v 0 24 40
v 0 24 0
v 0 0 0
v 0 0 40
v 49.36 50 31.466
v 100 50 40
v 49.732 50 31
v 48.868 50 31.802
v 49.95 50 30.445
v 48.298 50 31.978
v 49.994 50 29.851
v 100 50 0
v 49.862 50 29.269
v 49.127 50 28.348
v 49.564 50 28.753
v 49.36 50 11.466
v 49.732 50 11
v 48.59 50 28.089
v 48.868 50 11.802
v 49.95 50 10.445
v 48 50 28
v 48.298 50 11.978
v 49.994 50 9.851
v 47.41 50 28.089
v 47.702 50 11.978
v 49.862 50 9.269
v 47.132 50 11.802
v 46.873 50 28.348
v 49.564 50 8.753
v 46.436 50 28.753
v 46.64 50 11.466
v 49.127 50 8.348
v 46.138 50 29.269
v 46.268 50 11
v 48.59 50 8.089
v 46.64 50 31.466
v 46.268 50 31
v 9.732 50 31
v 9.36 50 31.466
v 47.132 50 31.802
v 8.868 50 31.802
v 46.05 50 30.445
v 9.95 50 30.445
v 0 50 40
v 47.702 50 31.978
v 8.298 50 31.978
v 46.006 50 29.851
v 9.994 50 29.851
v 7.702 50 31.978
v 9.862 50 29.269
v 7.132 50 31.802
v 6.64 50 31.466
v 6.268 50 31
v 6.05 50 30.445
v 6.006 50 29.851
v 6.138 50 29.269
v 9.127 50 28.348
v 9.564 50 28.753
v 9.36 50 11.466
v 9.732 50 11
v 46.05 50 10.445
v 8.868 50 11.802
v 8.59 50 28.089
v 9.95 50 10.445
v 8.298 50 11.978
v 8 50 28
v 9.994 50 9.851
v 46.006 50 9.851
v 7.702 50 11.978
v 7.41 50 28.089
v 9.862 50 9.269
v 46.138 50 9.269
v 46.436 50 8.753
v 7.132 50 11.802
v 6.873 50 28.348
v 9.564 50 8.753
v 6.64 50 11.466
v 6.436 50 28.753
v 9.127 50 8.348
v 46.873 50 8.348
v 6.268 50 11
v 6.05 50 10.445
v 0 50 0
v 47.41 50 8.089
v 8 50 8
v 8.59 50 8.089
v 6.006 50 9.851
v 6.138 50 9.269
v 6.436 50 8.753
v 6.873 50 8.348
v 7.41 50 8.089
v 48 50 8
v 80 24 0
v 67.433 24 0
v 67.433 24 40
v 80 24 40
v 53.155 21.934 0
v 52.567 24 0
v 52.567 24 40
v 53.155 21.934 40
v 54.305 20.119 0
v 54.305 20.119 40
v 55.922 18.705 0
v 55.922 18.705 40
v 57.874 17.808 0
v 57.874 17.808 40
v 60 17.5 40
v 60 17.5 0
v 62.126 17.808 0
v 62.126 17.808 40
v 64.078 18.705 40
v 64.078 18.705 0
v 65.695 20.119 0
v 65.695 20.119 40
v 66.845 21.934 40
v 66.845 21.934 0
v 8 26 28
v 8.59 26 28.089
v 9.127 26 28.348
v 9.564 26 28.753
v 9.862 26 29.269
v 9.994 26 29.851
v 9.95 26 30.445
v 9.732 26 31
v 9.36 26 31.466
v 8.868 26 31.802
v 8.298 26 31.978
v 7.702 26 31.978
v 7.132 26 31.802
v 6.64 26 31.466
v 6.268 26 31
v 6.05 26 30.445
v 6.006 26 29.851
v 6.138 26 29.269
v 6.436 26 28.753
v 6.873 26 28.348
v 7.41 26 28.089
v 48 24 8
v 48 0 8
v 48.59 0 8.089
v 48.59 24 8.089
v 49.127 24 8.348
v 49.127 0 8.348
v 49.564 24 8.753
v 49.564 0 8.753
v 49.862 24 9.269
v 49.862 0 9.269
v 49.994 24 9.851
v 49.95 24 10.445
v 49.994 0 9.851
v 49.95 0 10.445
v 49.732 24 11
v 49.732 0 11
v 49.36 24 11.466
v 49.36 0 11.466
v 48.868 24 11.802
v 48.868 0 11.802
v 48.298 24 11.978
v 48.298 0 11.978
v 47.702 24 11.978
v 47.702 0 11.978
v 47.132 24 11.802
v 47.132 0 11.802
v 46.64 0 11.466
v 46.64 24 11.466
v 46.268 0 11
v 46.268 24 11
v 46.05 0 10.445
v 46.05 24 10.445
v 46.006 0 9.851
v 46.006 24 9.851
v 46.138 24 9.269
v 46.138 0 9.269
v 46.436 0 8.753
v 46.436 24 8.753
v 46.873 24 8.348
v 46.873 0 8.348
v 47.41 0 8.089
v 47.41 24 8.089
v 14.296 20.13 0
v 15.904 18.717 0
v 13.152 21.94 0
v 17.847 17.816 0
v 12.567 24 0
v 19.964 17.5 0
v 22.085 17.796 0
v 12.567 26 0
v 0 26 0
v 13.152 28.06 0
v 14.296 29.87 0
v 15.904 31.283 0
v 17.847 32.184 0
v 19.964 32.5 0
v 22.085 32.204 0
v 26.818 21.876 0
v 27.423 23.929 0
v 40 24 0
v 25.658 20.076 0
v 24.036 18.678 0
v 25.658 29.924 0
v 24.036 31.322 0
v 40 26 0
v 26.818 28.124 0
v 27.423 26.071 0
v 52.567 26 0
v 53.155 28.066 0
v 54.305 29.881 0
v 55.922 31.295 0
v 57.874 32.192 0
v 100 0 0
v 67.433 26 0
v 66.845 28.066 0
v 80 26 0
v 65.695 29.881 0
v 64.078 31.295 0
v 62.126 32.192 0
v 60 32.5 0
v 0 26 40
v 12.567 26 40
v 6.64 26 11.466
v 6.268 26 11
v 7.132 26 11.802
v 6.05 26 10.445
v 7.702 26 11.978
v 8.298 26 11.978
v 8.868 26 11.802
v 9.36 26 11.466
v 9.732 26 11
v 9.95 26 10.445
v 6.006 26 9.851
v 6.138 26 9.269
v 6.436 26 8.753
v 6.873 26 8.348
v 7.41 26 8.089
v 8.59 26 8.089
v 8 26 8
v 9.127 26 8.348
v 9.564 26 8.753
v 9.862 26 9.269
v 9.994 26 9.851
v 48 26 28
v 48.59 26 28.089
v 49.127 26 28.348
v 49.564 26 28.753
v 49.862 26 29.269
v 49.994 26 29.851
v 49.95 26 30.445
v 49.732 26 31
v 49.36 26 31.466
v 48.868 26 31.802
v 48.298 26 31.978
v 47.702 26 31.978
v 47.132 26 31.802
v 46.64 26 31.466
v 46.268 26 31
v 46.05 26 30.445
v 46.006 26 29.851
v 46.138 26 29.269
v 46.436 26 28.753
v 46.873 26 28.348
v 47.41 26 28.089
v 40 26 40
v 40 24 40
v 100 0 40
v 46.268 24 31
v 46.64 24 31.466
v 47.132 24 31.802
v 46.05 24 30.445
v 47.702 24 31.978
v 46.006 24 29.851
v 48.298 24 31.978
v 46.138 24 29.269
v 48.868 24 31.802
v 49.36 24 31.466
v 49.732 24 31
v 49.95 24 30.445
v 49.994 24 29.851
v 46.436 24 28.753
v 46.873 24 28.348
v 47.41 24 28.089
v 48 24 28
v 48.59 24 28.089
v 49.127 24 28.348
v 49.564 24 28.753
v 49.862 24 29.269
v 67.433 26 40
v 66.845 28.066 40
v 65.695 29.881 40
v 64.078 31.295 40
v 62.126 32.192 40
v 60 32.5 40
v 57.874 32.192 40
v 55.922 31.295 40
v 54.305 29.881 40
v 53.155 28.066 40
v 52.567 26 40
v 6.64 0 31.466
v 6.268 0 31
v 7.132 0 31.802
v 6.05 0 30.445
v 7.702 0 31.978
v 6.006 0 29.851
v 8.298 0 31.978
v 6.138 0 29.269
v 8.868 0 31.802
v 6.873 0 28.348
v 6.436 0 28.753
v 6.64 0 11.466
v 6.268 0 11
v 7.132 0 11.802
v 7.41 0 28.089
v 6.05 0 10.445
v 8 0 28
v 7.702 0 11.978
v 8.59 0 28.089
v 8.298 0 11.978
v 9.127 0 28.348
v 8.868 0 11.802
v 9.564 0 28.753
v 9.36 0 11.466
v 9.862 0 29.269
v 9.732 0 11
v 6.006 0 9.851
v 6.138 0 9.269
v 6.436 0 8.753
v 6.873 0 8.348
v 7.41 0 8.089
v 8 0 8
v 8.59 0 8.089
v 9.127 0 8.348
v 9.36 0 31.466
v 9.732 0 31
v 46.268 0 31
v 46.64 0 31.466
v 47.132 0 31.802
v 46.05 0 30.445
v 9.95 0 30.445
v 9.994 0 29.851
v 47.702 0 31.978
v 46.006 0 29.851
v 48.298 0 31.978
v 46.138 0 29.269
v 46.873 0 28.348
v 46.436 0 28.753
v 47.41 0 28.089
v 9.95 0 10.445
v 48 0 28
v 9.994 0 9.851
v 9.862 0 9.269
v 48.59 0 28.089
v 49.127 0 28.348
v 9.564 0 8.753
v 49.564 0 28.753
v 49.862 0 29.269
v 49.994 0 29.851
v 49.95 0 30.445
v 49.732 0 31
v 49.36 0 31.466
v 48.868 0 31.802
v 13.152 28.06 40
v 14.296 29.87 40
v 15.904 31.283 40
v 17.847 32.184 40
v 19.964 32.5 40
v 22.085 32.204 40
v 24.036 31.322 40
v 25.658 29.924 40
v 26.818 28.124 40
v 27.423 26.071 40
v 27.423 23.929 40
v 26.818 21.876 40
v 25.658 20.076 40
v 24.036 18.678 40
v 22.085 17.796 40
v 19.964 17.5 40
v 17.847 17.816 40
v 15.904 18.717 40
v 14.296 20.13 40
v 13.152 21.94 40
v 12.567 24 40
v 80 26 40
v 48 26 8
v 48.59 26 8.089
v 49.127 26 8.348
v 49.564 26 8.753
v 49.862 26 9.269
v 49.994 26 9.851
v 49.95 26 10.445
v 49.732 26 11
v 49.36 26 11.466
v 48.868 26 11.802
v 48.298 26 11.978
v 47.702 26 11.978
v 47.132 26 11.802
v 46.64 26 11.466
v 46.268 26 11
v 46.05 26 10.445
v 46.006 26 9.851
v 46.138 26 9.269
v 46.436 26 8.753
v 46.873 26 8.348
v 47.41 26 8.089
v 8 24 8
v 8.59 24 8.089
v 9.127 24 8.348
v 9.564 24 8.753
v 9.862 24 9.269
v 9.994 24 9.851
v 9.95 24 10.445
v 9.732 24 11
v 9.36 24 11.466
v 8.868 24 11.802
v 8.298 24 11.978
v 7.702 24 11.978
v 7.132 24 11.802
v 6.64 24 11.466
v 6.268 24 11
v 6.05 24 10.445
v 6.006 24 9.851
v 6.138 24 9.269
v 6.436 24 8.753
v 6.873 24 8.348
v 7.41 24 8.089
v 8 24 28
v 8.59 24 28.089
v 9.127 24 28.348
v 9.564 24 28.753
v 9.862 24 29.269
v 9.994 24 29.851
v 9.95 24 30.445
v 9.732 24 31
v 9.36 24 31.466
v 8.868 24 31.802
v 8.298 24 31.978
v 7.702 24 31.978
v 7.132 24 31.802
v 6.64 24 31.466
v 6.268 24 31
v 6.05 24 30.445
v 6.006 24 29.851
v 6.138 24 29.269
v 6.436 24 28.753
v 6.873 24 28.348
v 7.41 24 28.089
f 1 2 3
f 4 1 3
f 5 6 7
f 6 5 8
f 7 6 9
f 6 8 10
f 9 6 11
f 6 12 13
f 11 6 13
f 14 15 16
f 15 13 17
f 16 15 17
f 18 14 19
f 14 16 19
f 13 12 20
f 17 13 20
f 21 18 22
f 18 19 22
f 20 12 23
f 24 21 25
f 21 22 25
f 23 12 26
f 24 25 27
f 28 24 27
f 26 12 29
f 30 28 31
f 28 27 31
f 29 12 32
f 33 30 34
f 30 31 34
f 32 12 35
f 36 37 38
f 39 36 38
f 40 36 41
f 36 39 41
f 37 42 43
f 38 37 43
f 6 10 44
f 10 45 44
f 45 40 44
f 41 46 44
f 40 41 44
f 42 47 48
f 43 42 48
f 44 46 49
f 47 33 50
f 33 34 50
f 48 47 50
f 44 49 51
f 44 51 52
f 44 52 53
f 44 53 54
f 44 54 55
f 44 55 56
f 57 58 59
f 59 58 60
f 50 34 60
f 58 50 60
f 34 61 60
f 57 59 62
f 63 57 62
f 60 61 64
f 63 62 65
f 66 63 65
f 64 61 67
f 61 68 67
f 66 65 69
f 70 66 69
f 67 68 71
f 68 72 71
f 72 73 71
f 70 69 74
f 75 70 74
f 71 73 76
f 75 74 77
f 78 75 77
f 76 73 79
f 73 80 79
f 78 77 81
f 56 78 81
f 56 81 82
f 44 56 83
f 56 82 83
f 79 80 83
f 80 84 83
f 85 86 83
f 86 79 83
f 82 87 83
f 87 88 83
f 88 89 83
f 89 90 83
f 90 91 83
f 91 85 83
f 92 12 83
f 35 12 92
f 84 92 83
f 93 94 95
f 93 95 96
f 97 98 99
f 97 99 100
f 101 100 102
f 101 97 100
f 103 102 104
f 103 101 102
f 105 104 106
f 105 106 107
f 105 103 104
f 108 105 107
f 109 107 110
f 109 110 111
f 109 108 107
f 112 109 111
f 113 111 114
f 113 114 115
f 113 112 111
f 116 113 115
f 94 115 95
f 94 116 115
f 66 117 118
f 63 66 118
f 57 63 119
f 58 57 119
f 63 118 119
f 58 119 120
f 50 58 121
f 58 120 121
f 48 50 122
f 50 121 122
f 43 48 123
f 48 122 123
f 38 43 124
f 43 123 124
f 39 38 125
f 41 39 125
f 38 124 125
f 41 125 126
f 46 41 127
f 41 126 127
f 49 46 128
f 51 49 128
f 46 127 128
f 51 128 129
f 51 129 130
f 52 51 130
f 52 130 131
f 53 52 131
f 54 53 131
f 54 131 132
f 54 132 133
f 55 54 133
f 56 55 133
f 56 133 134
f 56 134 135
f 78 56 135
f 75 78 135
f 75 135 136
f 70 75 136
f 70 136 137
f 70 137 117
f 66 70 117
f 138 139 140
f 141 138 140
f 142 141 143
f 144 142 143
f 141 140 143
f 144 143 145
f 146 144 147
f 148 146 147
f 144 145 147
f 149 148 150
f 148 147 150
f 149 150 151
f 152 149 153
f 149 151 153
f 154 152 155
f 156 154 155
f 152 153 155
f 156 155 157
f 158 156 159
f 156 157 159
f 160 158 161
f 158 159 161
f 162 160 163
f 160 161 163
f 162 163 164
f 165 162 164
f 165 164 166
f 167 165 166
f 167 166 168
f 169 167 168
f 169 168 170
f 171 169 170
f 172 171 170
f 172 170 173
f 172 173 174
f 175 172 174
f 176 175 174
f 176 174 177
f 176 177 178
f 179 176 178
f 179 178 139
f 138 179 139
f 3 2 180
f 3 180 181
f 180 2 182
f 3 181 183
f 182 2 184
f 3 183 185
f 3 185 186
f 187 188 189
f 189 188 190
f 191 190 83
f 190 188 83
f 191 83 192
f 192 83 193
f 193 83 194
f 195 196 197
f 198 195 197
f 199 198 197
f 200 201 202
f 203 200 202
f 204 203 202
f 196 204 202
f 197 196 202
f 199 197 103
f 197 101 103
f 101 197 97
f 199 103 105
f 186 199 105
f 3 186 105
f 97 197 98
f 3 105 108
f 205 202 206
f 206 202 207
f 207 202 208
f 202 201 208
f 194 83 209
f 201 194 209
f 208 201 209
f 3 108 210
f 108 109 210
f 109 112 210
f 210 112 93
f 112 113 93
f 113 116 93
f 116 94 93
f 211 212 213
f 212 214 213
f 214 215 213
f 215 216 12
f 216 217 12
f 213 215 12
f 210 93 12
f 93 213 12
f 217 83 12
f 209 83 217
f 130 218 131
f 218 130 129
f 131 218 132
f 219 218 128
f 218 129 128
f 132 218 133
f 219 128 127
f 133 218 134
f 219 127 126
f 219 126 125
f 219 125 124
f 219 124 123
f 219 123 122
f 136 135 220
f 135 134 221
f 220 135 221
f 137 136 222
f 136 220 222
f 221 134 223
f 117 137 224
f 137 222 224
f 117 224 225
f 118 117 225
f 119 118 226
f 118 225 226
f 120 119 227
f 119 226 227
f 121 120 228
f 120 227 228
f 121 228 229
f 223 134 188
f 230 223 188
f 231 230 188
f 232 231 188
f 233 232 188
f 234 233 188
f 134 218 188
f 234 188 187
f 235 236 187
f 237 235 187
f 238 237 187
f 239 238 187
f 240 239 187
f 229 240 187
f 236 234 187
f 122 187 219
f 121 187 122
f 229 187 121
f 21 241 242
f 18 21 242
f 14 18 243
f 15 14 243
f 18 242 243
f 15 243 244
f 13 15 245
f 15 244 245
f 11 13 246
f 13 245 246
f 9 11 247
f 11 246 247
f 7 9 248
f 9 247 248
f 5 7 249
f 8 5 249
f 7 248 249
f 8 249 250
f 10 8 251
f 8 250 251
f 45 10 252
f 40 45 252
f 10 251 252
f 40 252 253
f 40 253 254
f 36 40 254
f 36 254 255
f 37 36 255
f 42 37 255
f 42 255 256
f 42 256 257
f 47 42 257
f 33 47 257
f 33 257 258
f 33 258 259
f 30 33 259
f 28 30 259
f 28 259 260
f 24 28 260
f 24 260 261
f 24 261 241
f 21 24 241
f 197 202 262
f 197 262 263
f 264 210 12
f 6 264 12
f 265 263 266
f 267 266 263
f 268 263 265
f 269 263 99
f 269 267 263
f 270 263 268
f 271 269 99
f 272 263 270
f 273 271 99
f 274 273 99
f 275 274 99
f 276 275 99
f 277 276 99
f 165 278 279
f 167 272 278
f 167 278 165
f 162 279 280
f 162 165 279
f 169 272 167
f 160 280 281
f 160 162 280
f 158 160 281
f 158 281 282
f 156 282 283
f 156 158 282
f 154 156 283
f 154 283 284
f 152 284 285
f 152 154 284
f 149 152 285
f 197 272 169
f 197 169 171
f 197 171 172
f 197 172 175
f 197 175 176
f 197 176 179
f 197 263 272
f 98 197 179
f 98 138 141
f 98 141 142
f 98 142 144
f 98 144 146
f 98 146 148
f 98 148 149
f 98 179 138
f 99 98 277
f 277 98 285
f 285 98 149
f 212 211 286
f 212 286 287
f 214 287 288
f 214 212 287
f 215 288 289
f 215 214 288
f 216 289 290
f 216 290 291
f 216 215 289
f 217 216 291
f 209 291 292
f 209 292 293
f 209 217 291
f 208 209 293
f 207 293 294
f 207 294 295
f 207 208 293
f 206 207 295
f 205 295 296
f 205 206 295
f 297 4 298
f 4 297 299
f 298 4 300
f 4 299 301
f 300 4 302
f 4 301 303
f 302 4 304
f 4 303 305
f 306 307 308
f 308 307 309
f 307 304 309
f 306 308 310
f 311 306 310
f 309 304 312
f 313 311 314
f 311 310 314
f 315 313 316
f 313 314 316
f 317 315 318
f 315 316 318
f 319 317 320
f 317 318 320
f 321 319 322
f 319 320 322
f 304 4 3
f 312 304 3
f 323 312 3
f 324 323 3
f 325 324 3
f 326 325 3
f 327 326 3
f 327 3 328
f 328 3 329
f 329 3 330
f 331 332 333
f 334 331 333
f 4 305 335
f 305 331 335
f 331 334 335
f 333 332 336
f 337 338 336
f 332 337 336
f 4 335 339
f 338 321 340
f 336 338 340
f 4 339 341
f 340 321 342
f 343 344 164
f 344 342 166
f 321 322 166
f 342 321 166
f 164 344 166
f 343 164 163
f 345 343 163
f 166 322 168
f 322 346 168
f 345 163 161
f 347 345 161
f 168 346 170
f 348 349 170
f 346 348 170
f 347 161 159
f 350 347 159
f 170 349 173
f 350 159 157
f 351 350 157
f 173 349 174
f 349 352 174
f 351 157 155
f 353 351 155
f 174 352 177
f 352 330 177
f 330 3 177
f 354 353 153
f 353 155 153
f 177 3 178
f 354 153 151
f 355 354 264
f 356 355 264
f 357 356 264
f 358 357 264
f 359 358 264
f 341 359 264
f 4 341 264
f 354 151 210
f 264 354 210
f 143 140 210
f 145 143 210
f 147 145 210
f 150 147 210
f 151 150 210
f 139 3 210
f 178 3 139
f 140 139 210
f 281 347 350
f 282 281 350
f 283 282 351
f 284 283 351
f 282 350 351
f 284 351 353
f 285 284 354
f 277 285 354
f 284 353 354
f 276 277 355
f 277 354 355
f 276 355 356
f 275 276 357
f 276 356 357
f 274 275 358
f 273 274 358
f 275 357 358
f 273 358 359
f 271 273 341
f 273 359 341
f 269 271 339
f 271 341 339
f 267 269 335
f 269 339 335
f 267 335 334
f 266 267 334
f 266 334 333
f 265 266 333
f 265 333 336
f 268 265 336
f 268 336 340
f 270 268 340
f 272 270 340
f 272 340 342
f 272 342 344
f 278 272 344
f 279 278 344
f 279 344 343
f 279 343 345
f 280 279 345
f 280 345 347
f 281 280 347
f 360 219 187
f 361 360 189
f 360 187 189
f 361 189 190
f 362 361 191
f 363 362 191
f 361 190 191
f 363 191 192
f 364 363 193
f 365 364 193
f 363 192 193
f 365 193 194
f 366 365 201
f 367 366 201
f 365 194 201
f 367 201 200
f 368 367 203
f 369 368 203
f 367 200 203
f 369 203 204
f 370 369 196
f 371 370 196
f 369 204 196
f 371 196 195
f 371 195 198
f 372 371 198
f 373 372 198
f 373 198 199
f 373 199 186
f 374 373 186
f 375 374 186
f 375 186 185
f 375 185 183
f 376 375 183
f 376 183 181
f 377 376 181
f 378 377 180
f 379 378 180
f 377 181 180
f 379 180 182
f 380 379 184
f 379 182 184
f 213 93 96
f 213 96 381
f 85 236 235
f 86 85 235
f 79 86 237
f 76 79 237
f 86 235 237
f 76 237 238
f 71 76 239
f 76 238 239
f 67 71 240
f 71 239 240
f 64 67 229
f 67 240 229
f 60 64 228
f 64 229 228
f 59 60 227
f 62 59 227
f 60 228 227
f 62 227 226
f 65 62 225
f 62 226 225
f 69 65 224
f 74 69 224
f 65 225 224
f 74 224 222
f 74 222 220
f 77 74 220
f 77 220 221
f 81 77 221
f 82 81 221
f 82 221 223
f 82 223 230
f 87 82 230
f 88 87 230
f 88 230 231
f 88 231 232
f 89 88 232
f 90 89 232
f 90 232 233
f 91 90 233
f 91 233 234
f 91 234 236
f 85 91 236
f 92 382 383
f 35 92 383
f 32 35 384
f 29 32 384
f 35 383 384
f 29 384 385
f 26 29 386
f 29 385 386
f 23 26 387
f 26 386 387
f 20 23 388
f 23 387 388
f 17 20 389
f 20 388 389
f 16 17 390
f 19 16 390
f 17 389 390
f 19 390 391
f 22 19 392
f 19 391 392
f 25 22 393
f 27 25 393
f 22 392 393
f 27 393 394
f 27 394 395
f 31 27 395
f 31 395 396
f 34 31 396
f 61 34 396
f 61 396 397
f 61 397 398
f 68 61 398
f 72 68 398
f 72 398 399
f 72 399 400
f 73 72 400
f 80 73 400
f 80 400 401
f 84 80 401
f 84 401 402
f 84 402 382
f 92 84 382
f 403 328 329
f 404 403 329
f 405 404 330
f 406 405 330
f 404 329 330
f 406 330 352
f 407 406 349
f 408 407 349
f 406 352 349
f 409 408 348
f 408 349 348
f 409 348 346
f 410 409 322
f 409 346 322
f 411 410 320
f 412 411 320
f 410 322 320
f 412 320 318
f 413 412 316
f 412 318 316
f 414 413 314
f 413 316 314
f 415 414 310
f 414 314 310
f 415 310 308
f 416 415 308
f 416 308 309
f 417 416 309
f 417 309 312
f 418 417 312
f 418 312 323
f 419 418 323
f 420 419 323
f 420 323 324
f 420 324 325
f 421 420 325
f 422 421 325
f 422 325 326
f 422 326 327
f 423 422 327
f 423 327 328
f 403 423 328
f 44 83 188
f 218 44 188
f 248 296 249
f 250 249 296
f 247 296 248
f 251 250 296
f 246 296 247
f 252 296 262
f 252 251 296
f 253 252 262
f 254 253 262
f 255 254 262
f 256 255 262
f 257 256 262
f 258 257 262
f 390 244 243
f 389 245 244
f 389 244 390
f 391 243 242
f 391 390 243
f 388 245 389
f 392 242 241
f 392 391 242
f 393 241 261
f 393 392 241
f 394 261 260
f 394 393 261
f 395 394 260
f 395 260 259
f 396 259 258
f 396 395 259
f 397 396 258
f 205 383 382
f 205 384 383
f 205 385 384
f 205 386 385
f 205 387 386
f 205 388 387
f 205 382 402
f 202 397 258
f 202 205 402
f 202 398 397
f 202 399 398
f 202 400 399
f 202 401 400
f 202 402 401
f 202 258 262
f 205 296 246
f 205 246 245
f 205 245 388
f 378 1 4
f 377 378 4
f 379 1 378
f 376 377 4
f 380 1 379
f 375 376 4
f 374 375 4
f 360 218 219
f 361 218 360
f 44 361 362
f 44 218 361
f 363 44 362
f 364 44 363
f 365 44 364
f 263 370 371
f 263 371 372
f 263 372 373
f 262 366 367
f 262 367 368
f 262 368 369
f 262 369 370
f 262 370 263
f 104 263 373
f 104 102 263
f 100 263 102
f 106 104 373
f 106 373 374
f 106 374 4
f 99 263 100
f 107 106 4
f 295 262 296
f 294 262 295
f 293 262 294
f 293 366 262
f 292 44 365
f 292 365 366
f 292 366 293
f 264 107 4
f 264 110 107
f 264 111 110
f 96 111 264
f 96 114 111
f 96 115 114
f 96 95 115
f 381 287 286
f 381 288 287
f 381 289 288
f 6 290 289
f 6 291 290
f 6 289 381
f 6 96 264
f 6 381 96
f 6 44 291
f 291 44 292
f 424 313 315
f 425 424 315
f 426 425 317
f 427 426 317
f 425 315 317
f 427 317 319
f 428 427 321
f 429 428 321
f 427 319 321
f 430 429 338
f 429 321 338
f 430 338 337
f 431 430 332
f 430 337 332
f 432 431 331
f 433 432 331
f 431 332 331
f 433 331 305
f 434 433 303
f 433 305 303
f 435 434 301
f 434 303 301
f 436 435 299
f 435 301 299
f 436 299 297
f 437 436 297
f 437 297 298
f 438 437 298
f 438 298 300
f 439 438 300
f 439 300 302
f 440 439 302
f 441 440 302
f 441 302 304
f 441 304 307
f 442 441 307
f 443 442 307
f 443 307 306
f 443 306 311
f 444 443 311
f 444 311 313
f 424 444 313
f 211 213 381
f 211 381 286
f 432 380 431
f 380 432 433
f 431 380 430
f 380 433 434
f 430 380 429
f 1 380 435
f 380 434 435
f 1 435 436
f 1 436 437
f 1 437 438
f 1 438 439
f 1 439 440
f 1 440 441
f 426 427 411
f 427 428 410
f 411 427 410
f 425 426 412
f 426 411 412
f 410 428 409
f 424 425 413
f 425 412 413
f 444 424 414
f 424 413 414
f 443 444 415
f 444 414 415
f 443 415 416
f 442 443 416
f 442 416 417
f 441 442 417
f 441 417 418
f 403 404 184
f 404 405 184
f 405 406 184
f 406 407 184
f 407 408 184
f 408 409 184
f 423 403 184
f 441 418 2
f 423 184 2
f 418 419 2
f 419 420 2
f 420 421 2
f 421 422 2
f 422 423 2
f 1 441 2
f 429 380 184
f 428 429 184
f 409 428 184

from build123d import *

# Parameters (mm, degrees)
EXTRUDE_1_DEPTH     = 40
SKETCH_8_R          = 2
CUT_EXTRUDE_5_DEPTH = 50


with BuildPart() as part:
    # Эскиз1 → Бобышка-Вытянуть1 (new body)
    with BuildSketch(Plane.XY):
        with BuildLine():
            Line((0, 0), (100, 0))
            Line((100, 0), (100, 34))
            Line((100, 34), (100, 50))
            Line((100, 50), (0, 50))
            Line((0, 50), (0, 26))
            Line((0, 26), (12.566965626, 26))
            ThreePointArc((12.566965626, 26), (27.5, 25), (12.566965626, 24))
            Line((12.566965626, 24), (0, 24))
            Line((0, 24), (0, 0))
        make_face()
        with BuildLine():
            Line((52.566965626, 26), (40, 26))
            Line((40, 26), (40, 24))
            Line((40, 24), (52.566965626, 24))
            ThreePointArc((52.566965626, 24), (60, 17.5), (67.433034374, 24))
            Line((67.433034374, 24), (80, 24))
            Line((80, 24), (80, 26))
            Line((80, 26), (67.433034374, 26))
            ThreePointArc((67.433034374, 26), (60, 32.5), (52.566965626, 26))
        make_face(mode=Mode.SUBTRACT)
    extrude(amount=EXTRUDE_1_DEPTH)

    # Эскиз8 → Вырез-Вытянуть5 (cut)
    with BuildSketch(Plane.XZ):
        with Locations(Location((8, 30, 0), (0, 0, 270))):
            Circle(SKETCH_8_R)
        with Locations(Location((8, 10, 0), (0, 0, 270))):
            Circle(SKETCH_8_R)
        with Locations(Location((48, 30, 0), (0, 0, 270))):
            Circle(SKETCH_8_R)
        with Locations(Location((48, 10, 0), (0, 0, 270))):
            Circle(SKETCH_8_R)
    extrude(amount=-CUT_EXTRUDE_5_DEPTH, mode=Mode.SUBTRACT)


solid = part.part
